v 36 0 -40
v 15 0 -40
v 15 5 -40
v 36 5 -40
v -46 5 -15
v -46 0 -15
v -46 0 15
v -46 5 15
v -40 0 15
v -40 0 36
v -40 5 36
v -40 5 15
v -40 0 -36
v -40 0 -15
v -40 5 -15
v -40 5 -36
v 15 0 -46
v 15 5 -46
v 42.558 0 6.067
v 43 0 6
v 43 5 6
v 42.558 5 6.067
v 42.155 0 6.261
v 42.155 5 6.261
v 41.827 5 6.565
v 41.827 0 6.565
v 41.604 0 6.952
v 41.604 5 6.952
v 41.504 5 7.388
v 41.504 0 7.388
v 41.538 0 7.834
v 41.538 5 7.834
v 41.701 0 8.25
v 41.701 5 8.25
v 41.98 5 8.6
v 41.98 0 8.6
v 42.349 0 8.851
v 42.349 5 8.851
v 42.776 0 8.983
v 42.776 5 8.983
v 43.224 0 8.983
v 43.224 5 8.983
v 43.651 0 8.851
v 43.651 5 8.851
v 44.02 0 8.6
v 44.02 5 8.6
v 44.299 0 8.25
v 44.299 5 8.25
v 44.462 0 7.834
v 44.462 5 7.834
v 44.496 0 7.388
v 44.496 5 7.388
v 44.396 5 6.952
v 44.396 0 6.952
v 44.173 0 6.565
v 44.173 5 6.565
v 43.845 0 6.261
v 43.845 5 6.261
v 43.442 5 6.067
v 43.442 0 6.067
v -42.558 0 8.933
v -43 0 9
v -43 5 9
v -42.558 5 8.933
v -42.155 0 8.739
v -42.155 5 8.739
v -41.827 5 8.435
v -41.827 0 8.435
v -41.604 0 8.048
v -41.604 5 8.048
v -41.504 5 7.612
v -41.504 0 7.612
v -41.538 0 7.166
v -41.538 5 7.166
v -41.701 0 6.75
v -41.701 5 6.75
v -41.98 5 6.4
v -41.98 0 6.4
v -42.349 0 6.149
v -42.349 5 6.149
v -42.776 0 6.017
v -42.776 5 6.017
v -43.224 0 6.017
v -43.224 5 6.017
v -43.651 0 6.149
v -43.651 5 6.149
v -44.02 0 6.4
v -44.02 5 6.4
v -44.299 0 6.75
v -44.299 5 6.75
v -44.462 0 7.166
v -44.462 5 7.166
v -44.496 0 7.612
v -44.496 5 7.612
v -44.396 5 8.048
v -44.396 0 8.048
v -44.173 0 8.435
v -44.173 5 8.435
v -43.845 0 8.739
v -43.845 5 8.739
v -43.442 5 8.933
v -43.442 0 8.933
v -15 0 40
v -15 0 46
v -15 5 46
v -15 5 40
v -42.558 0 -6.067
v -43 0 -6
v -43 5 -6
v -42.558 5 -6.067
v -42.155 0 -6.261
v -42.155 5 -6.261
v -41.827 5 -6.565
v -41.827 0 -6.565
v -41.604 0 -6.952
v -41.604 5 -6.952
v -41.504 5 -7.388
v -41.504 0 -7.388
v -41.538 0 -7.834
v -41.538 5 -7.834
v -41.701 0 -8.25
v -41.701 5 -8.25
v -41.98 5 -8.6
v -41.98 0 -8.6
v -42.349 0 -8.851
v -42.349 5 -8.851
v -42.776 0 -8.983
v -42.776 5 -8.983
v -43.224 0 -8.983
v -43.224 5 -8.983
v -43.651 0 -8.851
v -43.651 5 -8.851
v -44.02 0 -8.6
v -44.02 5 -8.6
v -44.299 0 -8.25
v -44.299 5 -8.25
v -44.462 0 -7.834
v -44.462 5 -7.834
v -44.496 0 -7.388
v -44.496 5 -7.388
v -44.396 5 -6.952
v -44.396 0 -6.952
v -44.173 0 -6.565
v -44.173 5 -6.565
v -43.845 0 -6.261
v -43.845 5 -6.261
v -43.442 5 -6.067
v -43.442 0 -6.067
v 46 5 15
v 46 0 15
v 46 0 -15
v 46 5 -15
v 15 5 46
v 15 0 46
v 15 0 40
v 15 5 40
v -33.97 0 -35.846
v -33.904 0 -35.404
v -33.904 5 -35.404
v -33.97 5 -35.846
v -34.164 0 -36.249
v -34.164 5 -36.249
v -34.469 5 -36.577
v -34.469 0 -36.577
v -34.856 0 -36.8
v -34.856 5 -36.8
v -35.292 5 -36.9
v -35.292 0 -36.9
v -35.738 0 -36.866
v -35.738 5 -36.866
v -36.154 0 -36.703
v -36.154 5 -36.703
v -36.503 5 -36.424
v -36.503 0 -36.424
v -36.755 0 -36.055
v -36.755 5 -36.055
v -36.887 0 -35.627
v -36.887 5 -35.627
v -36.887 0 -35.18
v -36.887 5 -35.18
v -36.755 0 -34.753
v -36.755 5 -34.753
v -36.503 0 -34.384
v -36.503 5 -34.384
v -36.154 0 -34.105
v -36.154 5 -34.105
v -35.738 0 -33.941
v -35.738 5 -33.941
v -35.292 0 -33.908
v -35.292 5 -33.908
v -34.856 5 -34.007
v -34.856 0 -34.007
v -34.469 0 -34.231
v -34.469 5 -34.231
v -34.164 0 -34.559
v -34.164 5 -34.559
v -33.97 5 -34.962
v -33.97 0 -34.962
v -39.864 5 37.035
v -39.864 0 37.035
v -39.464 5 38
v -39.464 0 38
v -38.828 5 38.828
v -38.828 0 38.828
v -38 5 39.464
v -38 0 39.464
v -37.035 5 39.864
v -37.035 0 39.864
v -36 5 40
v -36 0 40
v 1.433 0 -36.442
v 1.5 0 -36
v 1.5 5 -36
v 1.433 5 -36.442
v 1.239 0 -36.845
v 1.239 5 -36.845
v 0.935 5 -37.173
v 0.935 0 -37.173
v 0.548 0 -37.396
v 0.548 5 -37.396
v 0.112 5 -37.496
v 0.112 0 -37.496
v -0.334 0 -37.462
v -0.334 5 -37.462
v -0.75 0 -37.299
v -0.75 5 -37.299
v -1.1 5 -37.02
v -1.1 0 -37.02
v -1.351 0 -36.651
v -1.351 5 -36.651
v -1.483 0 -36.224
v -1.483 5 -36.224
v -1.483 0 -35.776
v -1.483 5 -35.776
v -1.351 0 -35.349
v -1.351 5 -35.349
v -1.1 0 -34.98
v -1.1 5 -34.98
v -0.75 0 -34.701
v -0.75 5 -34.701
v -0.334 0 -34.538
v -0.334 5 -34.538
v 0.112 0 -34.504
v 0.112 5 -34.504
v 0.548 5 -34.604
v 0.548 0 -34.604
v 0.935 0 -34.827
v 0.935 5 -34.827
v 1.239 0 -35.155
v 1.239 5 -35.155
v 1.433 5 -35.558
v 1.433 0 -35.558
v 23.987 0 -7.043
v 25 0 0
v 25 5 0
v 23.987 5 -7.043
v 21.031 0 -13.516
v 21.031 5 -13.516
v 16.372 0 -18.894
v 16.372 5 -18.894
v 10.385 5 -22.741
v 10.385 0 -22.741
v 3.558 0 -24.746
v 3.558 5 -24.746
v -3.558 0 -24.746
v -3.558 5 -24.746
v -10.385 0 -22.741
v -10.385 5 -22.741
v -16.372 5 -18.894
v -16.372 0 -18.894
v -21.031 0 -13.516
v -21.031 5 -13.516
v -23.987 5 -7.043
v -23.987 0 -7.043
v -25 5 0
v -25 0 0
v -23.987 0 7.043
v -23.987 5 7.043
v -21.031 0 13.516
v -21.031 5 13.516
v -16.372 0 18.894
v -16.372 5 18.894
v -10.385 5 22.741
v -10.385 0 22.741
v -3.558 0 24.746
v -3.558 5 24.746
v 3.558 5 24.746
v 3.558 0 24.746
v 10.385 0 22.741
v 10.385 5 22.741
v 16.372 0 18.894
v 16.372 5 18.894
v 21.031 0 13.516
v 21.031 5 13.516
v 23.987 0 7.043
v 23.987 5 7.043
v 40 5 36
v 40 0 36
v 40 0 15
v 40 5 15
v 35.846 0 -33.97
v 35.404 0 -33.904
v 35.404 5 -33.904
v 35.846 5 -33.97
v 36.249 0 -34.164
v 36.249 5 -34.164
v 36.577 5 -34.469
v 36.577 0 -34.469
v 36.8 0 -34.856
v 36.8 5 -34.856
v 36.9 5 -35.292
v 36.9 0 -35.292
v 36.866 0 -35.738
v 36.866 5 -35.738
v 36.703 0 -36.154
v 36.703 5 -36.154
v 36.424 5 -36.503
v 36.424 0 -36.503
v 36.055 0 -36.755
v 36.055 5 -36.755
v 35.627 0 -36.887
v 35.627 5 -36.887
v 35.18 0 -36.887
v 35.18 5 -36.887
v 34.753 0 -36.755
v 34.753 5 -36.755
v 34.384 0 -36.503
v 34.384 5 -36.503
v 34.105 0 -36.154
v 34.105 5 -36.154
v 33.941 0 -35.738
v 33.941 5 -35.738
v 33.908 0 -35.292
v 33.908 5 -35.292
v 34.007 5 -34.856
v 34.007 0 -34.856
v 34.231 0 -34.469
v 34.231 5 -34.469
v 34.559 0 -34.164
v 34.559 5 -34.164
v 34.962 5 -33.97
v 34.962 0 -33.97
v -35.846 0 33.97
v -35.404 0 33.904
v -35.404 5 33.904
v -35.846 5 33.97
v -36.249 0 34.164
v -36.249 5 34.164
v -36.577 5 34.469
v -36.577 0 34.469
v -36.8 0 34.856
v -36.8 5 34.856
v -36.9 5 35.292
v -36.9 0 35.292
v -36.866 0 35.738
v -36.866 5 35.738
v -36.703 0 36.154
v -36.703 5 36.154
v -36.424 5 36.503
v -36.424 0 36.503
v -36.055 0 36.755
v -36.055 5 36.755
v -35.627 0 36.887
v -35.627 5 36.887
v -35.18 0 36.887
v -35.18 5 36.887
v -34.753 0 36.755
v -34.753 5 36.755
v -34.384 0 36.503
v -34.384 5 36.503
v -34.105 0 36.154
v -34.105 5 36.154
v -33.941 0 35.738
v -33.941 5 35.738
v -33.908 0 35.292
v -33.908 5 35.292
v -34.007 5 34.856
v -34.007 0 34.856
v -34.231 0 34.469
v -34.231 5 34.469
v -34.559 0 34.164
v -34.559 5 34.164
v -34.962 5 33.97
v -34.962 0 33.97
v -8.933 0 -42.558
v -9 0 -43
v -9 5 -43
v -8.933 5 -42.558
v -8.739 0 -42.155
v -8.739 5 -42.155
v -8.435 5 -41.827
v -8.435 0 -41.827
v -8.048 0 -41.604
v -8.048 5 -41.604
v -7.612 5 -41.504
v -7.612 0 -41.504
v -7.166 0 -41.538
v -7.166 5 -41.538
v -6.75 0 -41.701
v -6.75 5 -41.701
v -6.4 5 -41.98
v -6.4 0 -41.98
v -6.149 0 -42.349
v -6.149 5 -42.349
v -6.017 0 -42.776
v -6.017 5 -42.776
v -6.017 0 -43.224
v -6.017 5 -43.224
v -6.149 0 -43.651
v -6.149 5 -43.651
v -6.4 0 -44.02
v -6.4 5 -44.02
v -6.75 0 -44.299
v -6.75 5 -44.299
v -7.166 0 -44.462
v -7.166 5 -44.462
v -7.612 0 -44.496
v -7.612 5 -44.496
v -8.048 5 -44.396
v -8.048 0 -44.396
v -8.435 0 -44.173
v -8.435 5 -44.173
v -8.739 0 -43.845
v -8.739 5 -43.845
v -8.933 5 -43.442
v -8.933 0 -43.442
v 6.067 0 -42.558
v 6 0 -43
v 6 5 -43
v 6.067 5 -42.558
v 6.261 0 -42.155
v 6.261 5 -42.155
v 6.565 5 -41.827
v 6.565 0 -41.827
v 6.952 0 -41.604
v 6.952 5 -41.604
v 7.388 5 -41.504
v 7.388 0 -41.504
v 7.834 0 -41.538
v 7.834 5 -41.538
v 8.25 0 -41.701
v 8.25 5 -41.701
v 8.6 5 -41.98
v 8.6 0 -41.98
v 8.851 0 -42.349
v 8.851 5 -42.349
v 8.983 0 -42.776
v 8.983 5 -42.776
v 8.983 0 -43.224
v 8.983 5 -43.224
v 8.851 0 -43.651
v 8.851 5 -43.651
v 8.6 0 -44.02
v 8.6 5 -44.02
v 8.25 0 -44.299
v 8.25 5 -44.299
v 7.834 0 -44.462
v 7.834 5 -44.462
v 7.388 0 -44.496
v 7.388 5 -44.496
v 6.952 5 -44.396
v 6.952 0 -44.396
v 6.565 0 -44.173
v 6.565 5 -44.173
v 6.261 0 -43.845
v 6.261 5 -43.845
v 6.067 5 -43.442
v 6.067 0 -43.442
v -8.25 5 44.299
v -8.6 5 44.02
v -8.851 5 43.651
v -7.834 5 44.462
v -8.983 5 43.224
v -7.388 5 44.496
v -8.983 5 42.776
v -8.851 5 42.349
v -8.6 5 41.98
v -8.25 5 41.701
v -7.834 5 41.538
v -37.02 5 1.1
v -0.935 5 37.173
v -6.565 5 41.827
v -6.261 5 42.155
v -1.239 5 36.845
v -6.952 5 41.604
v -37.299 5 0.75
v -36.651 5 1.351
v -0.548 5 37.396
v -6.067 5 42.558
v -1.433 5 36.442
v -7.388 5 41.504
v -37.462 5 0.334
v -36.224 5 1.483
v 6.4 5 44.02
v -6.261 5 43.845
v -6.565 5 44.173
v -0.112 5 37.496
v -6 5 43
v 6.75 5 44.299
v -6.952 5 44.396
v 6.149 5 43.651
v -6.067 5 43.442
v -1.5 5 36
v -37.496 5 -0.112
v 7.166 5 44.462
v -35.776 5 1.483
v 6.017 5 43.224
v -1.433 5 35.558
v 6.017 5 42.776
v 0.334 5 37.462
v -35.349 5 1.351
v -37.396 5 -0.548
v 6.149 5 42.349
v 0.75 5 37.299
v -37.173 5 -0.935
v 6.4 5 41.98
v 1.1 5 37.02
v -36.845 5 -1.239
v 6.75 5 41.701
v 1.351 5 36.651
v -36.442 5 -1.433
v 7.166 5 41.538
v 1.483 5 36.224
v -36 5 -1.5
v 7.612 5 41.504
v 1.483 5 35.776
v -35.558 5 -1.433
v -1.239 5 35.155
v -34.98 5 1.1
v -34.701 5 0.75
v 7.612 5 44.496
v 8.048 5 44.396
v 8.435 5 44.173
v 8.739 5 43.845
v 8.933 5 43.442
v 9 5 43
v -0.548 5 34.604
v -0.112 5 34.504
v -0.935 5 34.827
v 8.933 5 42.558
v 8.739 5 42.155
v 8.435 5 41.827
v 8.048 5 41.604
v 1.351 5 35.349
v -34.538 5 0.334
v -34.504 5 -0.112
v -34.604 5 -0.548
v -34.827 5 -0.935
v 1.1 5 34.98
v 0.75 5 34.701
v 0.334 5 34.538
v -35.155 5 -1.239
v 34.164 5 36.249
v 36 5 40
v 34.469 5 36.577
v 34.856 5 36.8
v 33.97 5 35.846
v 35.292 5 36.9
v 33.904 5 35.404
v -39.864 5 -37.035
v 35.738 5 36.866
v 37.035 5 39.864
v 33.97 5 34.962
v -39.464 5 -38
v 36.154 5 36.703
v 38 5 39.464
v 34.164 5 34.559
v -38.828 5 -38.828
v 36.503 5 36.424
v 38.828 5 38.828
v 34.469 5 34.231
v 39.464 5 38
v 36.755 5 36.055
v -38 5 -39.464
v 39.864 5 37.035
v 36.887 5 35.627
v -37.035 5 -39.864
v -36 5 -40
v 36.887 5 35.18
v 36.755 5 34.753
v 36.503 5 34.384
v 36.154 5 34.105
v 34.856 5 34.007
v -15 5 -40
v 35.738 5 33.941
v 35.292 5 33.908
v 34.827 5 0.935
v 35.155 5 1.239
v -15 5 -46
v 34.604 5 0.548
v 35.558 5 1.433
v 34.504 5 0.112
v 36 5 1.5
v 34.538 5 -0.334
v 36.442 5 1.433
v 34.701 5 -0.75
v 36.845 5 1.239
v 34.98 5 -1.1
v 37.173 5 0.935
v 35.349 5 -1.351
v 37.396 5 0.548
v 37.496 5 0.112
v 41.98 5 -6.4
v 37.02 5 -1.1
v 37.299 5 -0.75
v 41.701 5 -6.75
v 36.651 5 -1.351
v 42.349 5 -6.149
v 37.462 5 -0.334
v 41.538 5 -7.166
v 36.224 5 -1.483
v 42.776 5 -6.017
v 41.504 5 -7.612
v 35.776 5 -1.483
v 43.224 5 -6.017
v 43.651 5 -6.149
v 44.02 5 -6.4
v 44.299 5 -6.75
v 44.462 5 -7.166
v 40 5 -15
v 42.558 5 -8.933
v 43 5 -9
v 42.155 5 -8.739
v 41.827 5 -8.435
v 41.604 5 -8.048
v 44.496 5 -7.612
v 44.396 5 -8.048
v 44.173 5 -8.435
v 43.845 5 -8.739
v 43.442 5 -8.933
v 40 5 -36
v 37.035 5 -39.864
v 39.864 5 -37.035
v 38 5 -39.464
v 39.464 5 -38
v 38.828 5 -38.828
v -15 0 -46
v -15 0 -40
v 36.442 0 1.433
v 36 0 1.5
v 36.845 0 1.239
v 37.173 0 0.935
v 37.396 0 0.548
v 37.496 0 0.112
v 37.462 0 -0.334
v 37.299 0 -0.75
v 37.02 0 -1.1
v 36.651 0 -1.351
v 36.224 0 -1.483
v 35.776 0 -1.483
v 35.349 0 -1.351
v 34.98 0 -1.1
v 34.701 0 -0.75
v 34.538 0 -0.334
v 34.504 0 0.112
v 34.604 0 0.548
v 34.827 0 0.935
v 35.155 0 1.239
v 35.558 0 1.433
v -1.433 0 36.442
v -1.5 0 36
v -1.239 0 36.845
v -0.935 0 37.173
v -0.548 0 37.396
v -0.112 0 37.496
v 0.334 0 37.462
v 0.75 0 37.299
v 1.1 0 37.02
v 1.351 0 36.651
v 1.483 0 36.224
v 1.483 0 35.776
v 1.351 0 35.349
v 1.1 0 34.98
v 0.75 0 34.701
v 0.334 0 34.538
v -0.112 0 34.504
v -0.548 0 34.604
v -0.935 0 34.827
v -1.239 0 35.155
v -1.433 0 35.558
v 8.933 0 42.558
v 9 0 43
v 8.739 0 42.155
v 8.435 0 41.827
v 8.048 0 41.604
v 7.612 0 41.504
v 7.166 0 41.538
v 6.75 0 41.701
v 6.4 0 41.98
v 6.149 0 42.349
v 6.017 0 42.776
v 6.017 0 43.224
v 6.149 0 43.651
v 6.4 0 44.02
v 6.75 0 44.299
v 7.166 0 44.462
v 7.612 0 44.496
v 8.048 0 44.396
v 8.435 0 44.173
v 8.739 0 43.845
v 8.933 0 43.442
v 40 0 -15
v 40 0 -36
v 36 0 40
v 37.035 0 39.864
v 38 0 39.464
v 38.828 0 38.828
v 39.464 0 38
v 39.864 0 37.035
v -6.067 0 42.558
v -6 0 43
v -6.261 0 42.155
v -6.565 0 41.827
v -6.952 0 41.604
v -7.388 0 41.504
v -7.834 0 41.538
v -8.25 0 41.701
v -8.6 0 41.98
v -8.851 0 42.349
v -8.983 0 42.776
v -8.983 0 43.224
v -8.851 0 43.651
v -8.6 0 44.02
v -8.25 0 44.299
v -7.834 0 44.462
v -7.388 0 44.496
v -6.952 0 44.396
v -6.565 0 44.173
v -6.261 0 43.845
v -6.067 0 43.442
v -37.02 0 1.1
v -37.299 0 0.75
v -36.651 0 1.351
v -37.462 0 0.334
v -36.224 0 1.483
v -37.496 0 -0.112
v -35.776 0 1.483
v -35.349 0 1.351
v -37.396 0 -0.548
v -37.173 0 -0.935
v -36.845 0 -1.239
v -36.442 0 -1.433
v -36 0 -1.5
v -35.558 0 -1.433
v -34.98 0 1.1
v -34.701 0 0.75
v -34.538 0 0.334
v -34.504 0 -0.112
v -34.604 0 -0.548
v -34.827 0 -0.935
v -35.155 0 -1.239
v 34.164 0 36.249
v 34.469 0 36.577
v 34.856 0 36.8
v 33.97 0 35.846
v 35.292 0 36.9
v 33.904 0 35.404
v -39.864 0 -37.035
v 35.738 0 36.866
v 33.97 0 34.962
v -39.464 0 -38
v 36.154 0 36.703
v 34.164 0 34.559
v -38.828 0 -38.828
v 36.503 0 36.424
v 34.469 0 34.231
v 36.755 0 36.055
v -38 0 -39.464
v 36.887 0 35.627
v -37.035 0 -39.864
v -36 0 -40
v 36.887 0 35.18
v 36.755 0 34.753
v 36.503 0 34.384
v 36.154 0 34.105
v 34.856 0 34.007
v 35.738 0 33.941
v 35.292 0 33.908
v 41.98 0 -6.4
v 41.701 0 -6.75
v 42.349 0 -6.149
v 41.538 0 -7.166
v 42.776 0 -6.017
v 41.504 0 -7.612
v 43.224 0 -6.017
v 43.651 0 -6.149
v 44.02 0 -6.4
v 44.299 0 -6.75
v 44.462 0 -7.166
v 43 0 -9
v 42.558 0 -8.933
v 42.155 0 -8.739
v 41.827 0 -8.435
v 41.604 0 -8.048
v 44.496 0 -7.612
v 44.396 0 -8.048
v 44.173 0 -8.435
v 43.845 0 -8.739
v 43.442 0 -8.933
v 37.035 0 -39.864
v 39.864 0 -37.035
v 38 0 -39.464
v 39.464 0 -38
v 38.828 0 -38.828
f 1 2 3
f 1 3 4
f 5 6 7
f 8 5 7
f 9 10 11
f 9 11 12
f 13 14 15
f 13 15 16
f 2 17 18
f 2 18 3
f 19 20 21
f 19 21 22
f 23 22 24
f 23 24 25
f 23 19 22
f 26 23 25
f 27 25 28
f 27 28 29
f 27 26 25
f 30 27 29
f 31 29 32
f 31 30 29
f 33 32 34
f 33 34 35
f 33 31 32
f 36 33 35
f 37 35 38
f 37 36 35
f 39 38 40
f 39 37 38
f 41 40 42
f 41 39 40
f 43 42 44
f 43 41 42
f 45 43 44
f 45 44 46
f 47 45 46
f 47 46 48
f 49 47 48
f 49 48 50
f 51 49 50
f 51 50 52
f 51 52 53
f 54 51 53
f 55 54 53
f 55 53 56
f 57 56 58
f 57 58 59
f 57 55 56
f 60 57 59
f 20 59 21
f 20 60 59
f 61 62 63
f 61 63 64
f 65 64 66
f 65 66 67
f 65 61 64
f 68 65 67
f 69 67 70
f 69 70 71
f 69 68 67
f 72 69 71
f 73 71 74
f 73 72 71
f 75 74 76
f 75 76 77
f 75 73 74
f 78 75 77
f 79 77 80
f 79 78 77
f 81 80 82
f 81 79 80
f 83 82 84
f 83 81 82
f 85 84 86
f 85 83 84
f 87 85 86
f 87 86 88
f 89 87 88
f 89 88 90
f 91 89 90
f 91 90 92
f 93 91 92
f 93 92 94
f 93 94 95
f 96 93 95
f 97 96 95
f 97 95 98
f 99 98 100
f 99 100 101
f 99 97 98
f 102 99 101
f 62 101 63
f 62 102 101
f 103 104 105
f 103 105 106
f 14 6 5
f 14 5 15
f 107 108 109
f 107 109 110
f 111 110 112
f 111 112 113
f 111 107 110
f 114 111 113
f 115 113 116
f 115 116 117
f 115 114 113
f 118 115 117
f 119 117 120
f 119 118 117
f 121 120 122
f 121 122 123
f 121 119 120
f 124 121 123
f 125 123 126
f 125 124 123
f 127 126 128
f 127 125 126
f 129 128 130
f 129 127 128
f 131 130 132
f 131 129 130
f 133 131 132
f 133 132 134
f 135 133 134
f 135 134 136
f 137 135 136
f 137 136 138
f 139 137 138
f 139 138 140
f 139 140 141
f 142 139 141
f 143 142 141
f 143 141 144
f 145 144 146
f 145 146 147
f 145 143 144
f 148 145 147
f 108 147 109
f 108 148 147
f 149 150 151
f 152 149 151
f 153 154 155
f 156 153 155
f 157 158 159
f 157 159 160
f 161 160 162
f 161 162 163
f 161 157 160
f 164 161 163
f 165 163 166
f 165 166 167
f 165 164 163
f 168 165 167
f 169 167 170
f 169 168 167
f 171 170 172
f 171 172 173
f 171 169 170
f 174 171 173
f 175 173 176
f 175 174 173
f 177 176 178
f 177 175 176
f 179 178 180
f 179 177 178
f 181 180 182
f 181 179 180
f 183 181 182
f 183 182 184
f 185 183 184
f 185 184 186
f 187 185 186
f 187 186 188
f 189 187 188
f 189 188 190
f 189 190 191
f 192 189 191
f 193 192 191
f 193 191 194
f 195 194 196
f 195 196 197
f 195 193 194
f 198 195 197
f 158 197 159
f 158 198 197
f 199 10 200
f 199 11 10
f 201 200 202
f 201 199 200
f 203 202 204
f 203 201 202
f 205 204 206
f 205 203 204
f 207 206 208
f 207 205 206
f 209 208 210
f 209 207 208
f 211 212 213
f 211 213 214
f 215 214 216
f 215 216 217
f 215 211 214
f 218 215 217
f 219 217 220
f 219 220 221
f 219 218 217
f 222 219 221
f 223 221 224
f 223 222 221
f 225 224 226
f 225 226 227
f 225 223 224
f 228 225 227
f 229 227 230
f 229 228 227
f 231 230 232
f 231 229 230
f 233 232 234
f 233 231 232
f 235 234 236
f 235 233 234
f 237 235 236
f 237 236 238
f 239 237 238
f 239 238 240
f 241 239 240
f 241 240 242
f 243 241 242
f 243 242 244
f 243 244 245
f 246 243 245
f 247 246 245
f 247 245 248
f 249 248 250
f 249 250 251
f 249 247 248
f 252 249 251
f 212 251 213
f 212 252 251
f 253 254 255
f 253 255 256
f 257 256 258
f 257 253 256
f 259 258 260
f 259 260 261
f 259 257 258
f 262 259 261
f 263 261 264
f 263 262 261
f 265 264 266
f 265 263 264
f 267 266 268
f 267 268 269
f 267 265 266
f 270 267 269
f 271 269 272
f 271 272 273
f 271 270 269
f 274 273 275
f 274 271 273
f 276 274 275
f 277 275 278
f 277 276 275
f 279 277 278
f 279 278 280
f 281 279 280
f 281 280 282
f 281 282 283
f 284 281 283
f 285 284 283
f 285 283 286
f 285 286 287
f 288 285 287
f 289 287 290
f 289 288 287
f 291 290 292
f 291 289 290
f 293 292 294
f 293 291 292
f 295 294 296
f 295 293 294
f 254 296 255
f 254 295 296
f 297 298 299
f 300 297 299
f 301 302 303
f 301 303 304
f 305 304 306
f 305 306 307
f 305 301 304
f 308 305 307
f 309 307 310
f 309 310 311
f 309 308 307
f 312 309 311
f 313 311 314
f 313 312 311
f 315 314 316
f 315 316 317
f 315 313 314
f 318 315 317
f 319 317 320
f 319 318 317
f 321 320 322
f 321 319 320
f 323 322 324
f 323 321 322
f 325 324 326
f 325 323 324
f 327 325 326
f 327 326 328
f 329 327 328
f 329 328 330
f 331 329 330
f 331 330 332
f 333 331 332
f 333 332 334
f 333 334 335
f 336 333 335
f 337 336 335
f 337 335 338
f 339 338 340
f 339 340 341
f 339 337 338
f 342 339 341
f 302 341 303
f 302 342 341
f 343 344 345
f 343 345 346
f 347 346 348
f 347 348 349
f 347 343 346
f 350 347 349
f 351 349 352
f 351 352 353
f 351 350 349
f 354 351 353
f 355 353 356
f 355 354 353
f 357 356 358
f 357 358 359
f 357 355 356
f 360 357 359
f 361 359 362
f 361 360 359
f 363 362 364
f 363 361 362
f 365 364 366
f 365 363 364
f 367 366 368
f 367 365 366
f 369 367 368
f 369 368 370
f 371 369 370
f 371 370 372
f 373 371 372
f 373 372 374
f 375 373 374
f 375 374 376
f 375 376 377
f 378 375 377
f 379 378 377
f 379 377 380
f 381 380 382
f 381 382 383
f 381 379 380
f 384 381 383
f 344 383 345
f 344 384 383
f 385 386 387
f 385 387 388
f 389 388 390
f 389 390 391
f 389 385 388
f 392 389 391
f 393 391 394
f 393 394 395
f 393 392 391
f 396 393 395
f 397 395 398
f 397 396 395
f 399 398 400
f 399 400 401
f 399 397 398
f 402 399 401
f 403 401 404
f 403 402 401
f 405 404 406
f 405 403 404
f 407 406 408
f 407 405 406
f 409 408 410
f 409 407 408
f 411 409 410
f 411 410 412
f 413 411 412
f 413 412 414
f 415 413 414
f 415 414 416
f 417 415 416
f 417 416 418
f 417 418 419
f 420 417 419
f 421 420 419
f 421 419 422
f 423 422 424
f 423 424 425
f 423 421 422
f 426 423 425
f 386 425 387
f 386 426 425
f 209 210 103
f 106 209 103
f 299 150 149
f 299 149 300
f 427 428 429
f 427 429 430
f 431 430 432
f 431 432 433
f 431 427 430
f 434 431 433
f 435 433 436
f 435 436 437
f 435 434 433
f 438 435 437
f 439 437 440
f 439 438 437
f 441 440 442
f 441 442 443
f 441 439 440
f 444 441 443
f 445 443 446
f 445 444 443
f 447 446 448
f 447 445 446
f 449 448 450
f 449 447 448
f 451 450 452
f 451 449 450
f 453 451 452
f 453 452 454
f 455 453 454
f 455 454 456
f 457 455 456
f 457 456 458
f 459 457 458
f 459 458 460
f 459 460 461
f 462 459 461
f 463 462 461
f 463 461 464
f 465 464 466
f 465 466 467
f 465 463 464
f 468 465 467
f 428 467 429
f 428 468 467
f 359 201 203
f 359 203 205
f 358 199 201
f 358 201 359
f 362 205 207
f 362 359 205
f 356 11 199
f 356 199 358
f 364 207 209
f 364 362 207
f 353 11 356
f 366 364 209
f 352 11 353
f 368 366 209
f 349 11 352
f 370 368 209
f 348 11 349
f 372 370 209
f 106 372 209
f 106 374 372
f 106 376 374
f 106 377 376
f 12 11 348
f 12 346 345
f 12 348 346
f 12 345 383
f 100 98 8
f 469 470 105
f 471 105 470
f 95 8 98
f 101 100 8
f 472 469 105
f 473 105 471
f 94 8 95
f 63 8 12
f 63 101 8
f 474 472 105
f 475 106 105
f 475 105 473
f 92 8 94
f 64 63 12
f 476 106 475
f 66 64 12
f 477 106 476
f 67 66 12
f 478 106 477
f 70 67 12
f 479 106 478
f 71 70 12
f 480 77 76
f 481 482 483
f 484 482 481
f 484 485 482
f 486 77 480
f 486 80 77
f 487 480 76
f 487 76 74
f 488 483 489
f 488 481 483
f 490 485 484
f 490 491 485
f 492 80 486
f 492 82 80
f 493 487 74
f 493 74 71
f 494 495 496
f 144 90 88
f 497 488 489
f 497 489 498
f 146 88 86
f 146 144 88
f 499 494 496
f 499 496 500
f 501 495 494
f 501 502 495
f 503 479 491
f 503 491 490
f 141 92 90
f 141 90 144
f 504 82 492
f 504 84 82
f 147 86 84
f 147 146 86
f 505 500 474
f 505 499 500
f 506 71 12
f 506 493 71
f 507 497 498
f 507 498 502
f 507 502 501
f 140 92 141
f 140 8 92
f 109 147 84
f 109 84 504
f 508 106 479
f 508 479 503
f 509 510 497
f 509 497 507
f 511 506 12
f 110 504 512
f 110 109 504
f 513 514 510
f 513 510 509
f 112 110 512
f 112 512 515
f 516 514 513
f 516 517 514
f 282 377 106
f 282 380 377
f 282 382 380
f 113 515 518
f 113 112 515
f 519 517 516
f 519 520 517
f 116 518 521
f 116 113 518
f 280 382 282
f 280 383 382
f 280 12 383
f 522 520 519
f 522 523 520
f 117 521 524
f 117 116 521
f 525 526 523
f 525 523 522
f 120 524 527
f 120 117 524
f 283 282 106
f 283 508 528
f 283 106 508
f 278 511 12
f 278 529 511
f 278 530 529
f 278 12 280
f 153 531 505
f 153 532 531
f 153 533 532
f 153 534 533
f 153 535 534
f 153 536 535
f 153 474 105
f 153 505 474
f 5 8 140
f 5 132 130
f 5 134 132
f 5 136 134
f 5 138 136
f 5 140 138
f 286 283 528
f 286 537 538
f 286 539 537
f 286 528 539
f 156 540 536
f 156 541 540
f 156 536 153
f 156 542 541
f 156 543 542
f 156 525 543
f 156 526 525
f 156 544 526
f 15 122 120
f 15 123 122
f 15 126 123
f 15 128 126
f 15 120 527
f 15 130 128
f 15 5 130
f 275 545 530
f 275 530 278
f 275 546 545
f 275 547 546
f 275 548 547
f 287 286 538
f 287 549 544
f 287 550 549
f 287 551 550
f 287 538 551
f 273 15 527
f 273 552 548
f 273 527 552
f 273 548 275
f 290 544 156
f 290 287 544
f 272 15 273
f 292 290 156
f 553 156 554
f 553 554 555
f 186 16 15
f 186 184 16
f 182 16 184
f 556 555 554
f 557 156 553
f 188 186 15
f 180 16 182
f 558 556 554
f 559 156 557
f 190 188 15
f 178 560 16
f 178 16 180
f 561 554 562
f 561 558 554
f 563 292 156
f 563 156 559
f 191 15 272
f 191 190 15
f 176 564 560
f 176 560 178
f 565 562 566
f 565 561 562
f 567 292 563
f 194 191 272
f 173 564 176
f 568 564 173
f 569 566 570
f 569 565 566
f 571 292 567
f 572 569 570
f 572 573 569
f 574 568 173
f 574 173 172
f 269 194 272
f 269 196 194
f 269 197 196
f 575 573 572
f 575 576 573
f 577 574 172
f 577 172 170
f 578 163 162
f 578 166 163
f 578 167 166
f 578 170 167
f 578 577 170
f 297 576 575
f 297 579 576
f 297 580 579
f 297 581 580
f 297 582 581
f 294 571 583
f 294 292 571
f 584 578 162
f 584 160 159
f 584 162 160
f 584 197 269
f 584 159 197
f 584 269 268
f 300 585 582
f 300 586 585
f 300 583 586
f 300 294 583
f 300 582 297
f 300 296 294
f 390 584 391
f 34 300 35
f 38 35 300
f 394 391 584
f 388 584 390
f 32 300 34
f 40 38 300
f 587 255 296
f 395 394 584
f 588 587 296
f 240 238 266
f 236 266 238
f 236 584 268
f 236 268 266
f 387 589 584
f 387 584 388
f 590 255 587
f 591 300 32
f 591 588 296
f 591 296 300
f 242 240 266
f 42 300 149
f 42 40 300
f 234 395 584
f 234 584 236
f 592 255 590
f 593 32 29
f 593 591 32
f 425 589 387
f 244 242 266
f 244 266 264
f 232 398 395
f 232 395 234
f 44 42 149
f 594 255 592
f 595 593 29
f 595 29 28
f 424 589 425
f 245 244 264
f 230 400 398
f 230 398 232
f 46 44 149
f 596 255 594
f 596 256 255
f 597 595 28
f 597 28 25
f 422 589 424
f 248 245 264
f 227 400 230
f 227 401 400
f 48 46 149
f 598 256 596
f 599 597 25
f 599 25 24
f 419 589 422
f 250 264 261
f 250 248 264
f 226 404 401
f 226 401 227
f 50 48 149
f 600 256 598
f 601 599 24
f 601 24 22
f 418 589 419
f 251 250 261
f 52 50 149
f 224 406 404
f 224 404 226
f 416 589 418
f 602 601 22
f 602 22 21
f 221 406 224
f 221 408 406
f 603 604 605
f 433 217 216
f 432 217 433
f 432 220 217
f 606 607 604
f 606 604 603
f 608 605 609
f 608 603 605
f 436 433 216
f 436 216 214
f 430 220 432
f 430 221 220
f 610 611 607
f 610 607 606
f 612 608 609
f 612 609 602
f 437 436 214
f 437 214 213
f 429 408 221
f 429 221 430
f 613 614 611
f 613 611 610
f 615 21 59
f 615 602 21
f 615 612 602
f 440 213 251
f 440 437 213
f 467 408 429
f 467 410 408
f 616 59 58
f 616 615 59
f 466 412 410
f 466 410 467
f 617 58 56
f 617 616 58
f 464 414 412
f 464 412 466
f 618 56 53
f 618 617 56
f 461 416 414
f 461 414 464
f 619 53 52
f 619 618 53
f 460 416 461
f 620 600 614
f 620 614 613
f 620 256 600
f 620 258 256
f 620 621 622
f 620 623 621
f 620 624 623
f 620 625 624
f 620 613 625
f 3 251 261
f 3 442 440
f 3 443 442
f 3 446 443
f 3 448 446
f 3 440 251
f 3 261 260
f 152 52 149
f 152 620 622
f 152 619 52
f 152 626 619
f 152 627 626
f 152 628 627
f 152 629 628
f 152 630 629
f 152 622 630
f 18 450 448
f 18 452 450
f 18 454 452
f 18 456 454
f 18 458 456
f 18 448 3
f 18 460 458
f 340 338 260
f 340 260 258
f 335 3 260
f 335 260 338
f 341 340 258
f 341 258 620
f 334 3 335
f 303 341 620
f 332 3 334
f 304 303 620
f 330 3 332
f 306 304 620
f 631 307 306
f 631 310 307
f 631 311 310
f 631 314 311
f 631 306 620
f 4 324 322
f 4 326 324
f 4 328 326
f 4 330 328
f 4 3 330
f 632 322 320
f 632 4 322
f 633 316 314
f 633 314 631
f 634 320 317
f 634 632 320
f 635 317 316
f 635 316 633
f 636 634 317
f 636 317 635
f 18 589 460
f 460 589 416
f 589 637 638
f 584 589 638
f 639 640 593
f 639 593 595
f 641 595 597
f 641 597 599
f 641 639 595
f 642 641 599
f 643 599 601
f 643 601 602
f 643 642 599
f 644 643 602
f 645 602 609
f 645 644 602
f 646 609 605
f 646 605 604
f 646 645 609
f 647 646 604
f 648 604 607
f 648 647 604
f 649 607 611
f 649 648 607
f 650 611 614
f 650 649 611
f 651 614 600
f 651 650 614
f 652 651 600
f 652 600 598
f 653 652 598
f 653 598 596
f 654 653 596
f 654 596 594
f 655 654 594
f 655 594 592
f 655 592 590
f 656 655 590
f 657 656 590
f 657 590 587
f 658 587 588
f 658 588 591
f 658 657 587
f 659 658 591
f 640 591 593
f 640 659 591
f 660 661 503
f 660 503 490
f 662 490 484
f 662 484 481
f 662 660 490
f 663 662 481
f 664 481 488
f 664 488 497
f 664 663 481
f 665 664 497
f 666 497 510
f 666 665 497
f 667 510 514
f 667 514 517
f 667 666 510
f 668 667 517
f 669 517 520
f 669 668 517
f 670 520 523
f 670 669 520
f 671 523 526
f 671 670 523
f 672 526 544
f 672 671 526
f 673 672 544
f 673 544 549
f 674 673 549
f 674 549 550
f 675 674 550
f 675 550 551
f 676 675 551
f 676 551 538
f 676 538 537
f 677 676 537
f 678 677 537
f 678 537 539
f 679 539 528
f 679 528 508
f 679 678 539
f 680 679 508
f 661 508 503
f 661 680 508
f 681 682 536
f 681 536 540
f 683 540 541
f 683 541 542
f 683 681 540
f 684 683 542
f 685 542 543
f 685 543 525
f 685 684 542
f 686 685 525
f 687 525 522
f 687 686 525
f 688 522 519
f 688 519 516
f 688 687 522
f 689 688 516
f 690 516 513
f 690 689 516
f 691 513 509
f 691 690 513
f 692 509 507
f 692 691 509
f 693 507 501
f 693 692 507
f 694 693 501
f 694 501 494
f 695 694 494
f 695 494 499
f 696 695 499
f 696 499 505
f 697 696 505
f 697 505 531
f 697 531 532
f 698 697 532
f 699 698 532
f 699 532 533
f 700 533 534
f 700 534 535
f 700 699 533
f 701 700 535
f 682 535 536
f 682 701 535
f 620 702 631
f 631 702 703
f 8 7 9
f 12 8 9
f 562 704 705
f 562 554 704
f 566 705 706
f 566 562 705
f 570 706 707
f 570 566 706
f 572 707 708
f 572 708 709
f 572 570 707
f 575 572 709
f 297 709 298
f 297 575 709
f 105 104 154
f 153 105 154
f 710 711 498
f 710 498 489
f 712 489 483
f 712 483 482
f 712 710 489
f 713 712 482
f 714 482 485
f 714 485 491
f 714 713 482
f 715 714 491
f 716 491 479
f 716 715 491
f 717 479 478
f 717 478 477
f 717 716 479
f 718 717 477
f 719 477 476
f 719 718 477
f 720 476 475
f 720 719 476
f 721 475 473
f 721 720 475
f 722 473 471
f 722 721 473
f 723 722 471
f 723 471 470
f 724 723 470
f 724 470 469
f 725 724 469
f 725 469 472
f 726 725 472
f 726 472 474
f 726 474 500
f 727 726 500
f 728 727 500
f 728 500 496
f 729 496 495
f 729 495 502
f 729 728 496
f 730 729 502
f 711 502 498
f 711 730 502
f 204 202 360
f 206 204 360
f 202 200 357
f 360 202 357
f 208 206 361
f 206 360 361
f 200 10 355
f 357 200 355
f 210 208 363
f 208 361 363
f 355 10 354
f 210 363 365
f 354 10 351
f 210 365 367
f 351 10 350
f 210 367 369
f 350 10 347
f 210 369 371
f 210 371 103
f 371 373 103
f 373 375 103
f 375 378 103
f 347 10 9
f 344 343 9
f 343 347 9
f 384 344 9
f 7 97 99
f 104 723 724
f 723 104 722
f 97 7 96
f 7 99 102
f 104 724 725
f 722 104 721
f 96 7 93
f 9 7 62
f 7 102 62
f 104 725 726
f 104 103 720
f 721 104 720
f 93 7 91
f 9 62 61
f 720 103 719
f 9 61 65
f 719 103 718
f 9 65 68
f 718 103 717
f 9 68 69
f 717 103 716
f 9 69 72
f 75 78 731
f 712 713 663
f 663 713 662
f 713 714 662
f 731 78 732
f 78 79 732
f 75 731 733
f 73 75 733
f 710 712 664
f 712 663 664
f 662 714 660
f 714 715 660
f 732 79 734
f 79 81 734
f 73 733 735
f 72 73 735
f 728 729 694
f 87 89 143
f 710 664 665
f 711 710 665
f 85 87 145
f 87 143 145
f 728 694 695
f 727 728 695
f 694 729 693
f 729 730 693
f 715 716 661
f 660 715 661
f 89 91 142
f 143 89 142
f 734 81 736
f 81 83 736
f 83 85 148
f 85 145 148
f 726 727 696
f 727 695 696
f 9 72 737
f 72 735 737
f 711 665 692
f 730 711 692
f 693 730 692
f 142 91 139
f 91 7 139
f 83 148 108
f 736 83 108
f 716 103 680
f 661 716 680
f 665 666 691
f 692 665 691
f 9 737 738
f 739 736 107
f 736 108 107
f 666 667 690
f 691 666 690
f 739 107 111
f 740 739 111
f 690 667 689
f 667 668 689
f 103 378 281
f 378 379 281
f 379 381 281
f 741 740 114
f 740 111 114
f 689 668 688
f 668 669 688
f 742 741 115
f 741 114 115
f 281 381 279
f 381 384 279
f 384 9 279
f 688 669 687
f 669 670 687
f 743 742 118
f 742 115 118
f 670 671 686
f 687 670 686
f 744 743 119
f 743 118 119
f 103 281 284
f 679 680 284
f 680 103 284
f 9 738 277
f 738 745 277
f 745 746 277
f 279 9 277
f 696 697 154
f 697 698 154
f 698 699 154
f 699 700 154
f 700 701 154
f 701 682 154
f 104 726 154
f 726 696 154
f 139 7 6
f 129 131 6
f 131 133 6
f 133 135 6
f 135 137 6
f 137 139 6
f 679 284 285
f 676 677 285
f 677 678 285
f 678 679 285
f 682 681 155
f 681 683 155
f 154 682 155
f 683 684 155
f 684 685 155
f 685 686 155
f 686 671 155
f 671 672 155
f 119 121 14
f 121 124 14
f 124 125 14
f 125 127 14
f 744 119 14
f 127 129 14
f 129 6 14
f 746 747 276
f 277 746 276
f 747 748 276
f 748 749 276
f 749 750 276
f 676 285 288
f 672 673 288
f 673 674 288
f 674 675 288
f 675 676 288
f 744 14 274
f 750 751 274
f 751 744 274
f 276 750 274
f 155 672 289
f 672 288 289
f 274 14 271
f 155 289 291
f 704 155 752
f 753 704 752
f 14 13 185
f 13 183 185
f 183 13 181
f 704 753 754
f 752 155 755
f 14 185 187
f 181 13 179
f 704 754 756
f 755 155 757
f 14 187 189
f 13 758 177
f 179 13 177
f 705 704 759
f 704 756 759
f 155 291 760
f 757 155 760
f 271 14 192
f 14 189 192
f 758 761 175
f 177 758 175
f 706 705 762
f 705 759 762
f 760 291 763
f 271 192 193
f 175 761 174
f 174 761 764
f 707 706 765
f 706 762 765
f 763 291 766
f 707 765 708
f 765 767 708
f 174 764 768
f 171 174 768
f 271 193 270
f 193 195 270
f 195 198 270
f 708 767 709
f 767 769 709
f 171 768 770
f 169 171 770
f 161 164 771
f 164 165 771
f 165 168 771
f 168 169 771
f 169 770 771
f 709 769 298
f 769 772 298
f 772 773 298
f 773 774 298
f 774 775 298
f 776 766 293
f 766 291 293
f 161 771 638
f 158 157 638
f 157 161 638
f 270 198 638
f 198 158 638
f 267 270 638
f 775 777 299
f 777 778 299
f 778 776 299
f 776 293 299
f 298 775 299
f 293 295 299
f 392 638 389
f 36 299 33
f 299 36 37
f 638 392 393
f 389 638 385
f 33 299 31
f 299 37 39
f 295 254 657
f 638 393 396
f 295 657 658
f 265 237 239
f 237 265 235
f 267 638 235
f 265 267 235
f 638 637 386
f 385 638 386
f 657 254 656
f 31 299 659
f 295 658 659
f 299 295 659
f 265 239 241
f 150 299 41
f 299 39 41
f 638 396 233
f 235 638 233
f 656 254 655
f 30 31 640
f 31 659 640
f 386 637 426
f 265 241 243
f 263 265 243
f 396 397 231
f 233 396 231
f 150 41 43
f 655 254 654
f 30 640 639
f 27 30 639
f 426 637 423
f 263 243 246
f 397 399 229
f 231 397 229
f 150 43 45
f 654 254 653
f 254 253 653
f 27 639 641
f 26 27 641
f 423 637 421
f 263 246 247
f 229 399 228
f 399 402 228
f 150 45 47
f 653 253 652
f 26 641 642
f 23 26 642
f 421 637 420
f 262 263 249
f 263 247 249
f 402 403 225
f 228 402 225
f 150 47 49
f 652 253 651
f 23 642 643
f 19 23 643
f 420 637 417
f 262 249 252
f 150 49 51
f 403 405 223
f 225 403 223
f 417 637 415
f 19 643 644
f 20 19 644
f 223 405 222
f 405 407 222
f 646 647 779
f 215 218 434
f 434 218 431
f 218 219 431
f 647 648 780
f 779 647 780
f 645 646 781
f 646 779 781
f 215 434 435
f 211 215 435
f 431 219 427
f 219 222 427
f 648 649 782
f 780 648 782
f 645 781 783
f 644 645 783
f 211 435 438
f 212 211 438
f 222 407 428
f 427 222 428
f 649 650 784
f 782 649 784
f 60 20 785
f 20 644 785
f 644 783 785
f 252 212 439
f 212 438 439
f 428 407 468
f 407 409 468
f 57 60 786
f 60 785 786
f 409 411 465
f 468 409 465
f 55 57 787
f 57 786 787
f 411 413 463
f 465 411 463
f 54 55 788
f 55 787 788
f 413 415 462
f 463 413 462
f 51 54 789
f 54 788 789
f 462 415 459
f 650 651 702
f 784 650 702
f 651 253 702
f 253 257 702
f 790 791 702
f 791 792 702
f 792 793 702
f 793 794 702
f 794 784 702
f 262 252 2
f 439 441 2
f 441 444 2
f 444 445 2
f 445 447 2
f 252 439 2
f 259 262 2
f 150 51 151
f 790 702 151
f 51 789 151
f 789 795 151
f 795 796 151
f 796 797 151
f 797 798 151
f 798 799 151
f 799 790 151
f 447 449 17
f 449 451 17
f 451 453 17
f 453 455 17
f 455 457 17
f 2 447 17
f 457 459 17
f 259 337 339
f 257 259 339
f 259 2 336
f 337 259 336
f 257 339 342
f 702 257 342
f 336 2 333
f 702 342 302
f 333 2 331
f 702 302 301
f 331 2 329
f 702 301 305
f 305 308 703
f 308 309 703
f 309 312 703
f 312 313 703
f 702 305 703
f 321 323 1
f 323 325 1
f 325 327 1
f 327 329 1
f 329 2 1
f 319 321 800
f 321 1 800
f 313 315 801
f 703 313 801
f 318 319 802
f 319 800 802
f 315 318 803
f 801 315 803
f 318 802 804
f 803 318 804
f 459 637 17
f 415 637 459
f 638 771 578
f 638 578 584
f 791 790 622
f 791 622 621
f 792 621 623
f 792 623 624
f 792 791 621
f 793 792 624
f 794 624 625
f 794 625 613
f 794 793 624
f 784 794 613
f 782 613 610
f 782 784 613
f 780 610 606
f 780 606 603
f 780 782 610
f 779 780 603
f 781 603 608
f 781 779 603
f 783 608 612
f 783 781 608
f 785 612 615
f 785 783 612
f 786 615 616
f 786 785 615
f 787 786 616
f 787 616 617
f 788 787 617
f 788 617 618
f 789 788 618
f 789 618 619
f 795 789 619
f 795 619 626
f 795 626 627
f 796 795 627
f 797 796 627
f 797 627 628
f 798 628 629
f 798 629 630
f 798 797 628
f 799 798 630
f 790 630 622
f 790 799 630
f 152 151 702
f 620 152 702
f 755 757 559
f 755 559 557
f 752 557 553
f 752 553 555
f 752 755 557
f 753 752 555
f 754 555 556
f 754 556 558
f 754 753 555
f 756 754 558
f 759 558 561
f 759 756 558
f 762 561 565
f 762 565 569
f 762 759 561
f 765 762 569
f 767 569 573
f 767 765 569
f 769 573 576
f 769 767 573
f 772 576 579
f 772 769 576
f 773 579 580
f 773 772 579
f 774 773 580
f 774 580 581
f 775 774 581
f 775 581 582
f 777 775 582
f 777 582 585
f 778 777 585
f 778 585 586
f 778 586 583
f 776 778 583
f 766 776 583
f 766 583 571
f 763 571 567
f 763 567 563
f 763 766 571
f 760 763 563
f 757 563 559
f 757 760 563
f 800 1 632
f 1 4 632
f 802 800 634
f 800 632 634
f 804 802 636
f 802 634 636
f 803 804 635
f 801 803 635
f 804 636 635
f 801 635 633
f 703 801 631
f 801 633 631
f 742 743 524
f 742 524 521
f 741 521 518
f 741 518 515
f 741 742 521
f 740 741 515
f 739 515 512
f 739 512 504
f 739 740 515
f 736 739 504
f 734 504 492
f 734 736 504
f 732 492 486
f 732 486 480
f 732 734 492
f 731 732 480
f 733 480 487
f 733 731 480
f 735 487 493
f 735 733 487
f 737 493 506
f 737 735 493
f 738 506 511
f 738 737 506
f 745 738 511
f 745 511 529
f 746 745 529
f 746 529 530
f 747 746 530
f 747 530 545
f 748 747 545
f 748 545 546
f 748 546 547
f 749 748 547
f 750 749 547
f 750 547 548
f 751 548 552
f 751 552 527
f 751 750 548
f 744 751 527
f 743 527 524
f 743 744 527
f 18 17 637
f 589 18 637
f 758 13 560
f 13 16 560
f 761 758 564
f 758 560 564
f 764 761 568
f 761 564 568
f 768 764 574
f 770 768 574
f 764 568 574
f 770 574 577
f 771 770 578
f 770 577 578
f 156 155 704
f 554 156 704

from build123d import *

# Parameters (mm, degrees)
SKETCH_1_W               = 80
SKETCH_1_H               = 80
SKETCH_1_R               = 25
EXTRUDE_1_DEPTH          = 5
SKETCH_3_R               = 1.5
CUT_EXTRUDE_2_DEPTH      = 5
PATTERN_CIRCULAR_1_COUNT = 4
FILLET_1_R               = 4
SKETCH_7_W               = 30
SKETCH_7_H               = 6
SKETCH_7_R               = 1.5
EXTRUDE_2_DEPTH          = 5
PATTERN_CIRCULAR_2_COUNT = 4


with BuildPart() as part:
    # 草图1 → 凸台-拉伸1 (new body)
    with BuildSketch(Plane(origin=(0, 0, 0), x_dir=(1, 0, 0), z_dir=(0, 1, 0))):
        Rectangle(SKETCH_1_W, SKETCH_1_H)
        Circle(SKETCH_1_R, mode=Mode.SUBTRACT)
    extrude(amount=EXTRUDE_1_DEPTH)

    # 草图3 → 切除-拉伸2 (cut)
    with BuildSketch(Plane(origin=(0, 0, 0), x_dir=(1, 0, 0), z_dir=(0, 1, 0))):
        with Locations((0, 36)):
            Circle(SKETCH_3_R)
        with Locations((-35.403805922, 35.403805922)):
            Circle(SKETCH_3_R)
    cut_extrude_2 = extrude(amount=CUT_EXTRUDE_2_DEPTH, mode=Mode.SUBTRACT)

    # 阵列(圆周)1: 切除-拉伸2 ×4 about axis
    pattern_circular_1_axis = Axis((0, 55, 0), (0, -1, 0))
    for i in range(1, PATTERN_CIRCULAR_1_COUNT):
        add(cut_extrude_2.rotate(pattern_circular_1_axis, i * 360 / PATTERN_CIRCULAR_1_COUNT), mode=Mode.SUBTRACT)

    # 圆角1
    fillet_1_edges = [part.edges().sort_by_distance(p)[0] for p in [
        (40, 2.5, 40),
        (40, 2.5, -40),
        (-40, 2.5, 40),
        (-40, 2.5, -40),
    ]]
    fillet(fillet_1_edges, radius=FILLET_1_R)

    # 草图7 → 凸台-拉伸2 (add)
    with BuildSketch(Plane(origin=(0, 0, 0), x_dir=(1, 0, 0), z_dir=(0, 1, 0))):
        with Locations((0, -43)):
            Rectangle(SKETCH_7_W, SKETCH_7_H)
        with Locations((-7.5, -43)):
            Circle(SKETCH_7_R, mode=Mode.SUBTRACT)
        with Locations((7.5, -43)):
            Circle(SKETCH_7_R, mode=Mode.SUBTRACT)
    extrude_2 = extrude(amount=EXTRUDE_2_DEPTH)

    # 阵列(圆周)2: 凸台-拉伸2 ×4 about axis
    pattern_circular_2_axis = Axis((0, 55, 0), (0, -1, 0))
    for i in range(1, PATTERN_CIRCULAR_2_COUNT):
        add(extrude_2.rotate(pattern_circular_2_axis, i * 360 / PATTERN_CIRCULAR_2_COUNT))


solid = part.part
